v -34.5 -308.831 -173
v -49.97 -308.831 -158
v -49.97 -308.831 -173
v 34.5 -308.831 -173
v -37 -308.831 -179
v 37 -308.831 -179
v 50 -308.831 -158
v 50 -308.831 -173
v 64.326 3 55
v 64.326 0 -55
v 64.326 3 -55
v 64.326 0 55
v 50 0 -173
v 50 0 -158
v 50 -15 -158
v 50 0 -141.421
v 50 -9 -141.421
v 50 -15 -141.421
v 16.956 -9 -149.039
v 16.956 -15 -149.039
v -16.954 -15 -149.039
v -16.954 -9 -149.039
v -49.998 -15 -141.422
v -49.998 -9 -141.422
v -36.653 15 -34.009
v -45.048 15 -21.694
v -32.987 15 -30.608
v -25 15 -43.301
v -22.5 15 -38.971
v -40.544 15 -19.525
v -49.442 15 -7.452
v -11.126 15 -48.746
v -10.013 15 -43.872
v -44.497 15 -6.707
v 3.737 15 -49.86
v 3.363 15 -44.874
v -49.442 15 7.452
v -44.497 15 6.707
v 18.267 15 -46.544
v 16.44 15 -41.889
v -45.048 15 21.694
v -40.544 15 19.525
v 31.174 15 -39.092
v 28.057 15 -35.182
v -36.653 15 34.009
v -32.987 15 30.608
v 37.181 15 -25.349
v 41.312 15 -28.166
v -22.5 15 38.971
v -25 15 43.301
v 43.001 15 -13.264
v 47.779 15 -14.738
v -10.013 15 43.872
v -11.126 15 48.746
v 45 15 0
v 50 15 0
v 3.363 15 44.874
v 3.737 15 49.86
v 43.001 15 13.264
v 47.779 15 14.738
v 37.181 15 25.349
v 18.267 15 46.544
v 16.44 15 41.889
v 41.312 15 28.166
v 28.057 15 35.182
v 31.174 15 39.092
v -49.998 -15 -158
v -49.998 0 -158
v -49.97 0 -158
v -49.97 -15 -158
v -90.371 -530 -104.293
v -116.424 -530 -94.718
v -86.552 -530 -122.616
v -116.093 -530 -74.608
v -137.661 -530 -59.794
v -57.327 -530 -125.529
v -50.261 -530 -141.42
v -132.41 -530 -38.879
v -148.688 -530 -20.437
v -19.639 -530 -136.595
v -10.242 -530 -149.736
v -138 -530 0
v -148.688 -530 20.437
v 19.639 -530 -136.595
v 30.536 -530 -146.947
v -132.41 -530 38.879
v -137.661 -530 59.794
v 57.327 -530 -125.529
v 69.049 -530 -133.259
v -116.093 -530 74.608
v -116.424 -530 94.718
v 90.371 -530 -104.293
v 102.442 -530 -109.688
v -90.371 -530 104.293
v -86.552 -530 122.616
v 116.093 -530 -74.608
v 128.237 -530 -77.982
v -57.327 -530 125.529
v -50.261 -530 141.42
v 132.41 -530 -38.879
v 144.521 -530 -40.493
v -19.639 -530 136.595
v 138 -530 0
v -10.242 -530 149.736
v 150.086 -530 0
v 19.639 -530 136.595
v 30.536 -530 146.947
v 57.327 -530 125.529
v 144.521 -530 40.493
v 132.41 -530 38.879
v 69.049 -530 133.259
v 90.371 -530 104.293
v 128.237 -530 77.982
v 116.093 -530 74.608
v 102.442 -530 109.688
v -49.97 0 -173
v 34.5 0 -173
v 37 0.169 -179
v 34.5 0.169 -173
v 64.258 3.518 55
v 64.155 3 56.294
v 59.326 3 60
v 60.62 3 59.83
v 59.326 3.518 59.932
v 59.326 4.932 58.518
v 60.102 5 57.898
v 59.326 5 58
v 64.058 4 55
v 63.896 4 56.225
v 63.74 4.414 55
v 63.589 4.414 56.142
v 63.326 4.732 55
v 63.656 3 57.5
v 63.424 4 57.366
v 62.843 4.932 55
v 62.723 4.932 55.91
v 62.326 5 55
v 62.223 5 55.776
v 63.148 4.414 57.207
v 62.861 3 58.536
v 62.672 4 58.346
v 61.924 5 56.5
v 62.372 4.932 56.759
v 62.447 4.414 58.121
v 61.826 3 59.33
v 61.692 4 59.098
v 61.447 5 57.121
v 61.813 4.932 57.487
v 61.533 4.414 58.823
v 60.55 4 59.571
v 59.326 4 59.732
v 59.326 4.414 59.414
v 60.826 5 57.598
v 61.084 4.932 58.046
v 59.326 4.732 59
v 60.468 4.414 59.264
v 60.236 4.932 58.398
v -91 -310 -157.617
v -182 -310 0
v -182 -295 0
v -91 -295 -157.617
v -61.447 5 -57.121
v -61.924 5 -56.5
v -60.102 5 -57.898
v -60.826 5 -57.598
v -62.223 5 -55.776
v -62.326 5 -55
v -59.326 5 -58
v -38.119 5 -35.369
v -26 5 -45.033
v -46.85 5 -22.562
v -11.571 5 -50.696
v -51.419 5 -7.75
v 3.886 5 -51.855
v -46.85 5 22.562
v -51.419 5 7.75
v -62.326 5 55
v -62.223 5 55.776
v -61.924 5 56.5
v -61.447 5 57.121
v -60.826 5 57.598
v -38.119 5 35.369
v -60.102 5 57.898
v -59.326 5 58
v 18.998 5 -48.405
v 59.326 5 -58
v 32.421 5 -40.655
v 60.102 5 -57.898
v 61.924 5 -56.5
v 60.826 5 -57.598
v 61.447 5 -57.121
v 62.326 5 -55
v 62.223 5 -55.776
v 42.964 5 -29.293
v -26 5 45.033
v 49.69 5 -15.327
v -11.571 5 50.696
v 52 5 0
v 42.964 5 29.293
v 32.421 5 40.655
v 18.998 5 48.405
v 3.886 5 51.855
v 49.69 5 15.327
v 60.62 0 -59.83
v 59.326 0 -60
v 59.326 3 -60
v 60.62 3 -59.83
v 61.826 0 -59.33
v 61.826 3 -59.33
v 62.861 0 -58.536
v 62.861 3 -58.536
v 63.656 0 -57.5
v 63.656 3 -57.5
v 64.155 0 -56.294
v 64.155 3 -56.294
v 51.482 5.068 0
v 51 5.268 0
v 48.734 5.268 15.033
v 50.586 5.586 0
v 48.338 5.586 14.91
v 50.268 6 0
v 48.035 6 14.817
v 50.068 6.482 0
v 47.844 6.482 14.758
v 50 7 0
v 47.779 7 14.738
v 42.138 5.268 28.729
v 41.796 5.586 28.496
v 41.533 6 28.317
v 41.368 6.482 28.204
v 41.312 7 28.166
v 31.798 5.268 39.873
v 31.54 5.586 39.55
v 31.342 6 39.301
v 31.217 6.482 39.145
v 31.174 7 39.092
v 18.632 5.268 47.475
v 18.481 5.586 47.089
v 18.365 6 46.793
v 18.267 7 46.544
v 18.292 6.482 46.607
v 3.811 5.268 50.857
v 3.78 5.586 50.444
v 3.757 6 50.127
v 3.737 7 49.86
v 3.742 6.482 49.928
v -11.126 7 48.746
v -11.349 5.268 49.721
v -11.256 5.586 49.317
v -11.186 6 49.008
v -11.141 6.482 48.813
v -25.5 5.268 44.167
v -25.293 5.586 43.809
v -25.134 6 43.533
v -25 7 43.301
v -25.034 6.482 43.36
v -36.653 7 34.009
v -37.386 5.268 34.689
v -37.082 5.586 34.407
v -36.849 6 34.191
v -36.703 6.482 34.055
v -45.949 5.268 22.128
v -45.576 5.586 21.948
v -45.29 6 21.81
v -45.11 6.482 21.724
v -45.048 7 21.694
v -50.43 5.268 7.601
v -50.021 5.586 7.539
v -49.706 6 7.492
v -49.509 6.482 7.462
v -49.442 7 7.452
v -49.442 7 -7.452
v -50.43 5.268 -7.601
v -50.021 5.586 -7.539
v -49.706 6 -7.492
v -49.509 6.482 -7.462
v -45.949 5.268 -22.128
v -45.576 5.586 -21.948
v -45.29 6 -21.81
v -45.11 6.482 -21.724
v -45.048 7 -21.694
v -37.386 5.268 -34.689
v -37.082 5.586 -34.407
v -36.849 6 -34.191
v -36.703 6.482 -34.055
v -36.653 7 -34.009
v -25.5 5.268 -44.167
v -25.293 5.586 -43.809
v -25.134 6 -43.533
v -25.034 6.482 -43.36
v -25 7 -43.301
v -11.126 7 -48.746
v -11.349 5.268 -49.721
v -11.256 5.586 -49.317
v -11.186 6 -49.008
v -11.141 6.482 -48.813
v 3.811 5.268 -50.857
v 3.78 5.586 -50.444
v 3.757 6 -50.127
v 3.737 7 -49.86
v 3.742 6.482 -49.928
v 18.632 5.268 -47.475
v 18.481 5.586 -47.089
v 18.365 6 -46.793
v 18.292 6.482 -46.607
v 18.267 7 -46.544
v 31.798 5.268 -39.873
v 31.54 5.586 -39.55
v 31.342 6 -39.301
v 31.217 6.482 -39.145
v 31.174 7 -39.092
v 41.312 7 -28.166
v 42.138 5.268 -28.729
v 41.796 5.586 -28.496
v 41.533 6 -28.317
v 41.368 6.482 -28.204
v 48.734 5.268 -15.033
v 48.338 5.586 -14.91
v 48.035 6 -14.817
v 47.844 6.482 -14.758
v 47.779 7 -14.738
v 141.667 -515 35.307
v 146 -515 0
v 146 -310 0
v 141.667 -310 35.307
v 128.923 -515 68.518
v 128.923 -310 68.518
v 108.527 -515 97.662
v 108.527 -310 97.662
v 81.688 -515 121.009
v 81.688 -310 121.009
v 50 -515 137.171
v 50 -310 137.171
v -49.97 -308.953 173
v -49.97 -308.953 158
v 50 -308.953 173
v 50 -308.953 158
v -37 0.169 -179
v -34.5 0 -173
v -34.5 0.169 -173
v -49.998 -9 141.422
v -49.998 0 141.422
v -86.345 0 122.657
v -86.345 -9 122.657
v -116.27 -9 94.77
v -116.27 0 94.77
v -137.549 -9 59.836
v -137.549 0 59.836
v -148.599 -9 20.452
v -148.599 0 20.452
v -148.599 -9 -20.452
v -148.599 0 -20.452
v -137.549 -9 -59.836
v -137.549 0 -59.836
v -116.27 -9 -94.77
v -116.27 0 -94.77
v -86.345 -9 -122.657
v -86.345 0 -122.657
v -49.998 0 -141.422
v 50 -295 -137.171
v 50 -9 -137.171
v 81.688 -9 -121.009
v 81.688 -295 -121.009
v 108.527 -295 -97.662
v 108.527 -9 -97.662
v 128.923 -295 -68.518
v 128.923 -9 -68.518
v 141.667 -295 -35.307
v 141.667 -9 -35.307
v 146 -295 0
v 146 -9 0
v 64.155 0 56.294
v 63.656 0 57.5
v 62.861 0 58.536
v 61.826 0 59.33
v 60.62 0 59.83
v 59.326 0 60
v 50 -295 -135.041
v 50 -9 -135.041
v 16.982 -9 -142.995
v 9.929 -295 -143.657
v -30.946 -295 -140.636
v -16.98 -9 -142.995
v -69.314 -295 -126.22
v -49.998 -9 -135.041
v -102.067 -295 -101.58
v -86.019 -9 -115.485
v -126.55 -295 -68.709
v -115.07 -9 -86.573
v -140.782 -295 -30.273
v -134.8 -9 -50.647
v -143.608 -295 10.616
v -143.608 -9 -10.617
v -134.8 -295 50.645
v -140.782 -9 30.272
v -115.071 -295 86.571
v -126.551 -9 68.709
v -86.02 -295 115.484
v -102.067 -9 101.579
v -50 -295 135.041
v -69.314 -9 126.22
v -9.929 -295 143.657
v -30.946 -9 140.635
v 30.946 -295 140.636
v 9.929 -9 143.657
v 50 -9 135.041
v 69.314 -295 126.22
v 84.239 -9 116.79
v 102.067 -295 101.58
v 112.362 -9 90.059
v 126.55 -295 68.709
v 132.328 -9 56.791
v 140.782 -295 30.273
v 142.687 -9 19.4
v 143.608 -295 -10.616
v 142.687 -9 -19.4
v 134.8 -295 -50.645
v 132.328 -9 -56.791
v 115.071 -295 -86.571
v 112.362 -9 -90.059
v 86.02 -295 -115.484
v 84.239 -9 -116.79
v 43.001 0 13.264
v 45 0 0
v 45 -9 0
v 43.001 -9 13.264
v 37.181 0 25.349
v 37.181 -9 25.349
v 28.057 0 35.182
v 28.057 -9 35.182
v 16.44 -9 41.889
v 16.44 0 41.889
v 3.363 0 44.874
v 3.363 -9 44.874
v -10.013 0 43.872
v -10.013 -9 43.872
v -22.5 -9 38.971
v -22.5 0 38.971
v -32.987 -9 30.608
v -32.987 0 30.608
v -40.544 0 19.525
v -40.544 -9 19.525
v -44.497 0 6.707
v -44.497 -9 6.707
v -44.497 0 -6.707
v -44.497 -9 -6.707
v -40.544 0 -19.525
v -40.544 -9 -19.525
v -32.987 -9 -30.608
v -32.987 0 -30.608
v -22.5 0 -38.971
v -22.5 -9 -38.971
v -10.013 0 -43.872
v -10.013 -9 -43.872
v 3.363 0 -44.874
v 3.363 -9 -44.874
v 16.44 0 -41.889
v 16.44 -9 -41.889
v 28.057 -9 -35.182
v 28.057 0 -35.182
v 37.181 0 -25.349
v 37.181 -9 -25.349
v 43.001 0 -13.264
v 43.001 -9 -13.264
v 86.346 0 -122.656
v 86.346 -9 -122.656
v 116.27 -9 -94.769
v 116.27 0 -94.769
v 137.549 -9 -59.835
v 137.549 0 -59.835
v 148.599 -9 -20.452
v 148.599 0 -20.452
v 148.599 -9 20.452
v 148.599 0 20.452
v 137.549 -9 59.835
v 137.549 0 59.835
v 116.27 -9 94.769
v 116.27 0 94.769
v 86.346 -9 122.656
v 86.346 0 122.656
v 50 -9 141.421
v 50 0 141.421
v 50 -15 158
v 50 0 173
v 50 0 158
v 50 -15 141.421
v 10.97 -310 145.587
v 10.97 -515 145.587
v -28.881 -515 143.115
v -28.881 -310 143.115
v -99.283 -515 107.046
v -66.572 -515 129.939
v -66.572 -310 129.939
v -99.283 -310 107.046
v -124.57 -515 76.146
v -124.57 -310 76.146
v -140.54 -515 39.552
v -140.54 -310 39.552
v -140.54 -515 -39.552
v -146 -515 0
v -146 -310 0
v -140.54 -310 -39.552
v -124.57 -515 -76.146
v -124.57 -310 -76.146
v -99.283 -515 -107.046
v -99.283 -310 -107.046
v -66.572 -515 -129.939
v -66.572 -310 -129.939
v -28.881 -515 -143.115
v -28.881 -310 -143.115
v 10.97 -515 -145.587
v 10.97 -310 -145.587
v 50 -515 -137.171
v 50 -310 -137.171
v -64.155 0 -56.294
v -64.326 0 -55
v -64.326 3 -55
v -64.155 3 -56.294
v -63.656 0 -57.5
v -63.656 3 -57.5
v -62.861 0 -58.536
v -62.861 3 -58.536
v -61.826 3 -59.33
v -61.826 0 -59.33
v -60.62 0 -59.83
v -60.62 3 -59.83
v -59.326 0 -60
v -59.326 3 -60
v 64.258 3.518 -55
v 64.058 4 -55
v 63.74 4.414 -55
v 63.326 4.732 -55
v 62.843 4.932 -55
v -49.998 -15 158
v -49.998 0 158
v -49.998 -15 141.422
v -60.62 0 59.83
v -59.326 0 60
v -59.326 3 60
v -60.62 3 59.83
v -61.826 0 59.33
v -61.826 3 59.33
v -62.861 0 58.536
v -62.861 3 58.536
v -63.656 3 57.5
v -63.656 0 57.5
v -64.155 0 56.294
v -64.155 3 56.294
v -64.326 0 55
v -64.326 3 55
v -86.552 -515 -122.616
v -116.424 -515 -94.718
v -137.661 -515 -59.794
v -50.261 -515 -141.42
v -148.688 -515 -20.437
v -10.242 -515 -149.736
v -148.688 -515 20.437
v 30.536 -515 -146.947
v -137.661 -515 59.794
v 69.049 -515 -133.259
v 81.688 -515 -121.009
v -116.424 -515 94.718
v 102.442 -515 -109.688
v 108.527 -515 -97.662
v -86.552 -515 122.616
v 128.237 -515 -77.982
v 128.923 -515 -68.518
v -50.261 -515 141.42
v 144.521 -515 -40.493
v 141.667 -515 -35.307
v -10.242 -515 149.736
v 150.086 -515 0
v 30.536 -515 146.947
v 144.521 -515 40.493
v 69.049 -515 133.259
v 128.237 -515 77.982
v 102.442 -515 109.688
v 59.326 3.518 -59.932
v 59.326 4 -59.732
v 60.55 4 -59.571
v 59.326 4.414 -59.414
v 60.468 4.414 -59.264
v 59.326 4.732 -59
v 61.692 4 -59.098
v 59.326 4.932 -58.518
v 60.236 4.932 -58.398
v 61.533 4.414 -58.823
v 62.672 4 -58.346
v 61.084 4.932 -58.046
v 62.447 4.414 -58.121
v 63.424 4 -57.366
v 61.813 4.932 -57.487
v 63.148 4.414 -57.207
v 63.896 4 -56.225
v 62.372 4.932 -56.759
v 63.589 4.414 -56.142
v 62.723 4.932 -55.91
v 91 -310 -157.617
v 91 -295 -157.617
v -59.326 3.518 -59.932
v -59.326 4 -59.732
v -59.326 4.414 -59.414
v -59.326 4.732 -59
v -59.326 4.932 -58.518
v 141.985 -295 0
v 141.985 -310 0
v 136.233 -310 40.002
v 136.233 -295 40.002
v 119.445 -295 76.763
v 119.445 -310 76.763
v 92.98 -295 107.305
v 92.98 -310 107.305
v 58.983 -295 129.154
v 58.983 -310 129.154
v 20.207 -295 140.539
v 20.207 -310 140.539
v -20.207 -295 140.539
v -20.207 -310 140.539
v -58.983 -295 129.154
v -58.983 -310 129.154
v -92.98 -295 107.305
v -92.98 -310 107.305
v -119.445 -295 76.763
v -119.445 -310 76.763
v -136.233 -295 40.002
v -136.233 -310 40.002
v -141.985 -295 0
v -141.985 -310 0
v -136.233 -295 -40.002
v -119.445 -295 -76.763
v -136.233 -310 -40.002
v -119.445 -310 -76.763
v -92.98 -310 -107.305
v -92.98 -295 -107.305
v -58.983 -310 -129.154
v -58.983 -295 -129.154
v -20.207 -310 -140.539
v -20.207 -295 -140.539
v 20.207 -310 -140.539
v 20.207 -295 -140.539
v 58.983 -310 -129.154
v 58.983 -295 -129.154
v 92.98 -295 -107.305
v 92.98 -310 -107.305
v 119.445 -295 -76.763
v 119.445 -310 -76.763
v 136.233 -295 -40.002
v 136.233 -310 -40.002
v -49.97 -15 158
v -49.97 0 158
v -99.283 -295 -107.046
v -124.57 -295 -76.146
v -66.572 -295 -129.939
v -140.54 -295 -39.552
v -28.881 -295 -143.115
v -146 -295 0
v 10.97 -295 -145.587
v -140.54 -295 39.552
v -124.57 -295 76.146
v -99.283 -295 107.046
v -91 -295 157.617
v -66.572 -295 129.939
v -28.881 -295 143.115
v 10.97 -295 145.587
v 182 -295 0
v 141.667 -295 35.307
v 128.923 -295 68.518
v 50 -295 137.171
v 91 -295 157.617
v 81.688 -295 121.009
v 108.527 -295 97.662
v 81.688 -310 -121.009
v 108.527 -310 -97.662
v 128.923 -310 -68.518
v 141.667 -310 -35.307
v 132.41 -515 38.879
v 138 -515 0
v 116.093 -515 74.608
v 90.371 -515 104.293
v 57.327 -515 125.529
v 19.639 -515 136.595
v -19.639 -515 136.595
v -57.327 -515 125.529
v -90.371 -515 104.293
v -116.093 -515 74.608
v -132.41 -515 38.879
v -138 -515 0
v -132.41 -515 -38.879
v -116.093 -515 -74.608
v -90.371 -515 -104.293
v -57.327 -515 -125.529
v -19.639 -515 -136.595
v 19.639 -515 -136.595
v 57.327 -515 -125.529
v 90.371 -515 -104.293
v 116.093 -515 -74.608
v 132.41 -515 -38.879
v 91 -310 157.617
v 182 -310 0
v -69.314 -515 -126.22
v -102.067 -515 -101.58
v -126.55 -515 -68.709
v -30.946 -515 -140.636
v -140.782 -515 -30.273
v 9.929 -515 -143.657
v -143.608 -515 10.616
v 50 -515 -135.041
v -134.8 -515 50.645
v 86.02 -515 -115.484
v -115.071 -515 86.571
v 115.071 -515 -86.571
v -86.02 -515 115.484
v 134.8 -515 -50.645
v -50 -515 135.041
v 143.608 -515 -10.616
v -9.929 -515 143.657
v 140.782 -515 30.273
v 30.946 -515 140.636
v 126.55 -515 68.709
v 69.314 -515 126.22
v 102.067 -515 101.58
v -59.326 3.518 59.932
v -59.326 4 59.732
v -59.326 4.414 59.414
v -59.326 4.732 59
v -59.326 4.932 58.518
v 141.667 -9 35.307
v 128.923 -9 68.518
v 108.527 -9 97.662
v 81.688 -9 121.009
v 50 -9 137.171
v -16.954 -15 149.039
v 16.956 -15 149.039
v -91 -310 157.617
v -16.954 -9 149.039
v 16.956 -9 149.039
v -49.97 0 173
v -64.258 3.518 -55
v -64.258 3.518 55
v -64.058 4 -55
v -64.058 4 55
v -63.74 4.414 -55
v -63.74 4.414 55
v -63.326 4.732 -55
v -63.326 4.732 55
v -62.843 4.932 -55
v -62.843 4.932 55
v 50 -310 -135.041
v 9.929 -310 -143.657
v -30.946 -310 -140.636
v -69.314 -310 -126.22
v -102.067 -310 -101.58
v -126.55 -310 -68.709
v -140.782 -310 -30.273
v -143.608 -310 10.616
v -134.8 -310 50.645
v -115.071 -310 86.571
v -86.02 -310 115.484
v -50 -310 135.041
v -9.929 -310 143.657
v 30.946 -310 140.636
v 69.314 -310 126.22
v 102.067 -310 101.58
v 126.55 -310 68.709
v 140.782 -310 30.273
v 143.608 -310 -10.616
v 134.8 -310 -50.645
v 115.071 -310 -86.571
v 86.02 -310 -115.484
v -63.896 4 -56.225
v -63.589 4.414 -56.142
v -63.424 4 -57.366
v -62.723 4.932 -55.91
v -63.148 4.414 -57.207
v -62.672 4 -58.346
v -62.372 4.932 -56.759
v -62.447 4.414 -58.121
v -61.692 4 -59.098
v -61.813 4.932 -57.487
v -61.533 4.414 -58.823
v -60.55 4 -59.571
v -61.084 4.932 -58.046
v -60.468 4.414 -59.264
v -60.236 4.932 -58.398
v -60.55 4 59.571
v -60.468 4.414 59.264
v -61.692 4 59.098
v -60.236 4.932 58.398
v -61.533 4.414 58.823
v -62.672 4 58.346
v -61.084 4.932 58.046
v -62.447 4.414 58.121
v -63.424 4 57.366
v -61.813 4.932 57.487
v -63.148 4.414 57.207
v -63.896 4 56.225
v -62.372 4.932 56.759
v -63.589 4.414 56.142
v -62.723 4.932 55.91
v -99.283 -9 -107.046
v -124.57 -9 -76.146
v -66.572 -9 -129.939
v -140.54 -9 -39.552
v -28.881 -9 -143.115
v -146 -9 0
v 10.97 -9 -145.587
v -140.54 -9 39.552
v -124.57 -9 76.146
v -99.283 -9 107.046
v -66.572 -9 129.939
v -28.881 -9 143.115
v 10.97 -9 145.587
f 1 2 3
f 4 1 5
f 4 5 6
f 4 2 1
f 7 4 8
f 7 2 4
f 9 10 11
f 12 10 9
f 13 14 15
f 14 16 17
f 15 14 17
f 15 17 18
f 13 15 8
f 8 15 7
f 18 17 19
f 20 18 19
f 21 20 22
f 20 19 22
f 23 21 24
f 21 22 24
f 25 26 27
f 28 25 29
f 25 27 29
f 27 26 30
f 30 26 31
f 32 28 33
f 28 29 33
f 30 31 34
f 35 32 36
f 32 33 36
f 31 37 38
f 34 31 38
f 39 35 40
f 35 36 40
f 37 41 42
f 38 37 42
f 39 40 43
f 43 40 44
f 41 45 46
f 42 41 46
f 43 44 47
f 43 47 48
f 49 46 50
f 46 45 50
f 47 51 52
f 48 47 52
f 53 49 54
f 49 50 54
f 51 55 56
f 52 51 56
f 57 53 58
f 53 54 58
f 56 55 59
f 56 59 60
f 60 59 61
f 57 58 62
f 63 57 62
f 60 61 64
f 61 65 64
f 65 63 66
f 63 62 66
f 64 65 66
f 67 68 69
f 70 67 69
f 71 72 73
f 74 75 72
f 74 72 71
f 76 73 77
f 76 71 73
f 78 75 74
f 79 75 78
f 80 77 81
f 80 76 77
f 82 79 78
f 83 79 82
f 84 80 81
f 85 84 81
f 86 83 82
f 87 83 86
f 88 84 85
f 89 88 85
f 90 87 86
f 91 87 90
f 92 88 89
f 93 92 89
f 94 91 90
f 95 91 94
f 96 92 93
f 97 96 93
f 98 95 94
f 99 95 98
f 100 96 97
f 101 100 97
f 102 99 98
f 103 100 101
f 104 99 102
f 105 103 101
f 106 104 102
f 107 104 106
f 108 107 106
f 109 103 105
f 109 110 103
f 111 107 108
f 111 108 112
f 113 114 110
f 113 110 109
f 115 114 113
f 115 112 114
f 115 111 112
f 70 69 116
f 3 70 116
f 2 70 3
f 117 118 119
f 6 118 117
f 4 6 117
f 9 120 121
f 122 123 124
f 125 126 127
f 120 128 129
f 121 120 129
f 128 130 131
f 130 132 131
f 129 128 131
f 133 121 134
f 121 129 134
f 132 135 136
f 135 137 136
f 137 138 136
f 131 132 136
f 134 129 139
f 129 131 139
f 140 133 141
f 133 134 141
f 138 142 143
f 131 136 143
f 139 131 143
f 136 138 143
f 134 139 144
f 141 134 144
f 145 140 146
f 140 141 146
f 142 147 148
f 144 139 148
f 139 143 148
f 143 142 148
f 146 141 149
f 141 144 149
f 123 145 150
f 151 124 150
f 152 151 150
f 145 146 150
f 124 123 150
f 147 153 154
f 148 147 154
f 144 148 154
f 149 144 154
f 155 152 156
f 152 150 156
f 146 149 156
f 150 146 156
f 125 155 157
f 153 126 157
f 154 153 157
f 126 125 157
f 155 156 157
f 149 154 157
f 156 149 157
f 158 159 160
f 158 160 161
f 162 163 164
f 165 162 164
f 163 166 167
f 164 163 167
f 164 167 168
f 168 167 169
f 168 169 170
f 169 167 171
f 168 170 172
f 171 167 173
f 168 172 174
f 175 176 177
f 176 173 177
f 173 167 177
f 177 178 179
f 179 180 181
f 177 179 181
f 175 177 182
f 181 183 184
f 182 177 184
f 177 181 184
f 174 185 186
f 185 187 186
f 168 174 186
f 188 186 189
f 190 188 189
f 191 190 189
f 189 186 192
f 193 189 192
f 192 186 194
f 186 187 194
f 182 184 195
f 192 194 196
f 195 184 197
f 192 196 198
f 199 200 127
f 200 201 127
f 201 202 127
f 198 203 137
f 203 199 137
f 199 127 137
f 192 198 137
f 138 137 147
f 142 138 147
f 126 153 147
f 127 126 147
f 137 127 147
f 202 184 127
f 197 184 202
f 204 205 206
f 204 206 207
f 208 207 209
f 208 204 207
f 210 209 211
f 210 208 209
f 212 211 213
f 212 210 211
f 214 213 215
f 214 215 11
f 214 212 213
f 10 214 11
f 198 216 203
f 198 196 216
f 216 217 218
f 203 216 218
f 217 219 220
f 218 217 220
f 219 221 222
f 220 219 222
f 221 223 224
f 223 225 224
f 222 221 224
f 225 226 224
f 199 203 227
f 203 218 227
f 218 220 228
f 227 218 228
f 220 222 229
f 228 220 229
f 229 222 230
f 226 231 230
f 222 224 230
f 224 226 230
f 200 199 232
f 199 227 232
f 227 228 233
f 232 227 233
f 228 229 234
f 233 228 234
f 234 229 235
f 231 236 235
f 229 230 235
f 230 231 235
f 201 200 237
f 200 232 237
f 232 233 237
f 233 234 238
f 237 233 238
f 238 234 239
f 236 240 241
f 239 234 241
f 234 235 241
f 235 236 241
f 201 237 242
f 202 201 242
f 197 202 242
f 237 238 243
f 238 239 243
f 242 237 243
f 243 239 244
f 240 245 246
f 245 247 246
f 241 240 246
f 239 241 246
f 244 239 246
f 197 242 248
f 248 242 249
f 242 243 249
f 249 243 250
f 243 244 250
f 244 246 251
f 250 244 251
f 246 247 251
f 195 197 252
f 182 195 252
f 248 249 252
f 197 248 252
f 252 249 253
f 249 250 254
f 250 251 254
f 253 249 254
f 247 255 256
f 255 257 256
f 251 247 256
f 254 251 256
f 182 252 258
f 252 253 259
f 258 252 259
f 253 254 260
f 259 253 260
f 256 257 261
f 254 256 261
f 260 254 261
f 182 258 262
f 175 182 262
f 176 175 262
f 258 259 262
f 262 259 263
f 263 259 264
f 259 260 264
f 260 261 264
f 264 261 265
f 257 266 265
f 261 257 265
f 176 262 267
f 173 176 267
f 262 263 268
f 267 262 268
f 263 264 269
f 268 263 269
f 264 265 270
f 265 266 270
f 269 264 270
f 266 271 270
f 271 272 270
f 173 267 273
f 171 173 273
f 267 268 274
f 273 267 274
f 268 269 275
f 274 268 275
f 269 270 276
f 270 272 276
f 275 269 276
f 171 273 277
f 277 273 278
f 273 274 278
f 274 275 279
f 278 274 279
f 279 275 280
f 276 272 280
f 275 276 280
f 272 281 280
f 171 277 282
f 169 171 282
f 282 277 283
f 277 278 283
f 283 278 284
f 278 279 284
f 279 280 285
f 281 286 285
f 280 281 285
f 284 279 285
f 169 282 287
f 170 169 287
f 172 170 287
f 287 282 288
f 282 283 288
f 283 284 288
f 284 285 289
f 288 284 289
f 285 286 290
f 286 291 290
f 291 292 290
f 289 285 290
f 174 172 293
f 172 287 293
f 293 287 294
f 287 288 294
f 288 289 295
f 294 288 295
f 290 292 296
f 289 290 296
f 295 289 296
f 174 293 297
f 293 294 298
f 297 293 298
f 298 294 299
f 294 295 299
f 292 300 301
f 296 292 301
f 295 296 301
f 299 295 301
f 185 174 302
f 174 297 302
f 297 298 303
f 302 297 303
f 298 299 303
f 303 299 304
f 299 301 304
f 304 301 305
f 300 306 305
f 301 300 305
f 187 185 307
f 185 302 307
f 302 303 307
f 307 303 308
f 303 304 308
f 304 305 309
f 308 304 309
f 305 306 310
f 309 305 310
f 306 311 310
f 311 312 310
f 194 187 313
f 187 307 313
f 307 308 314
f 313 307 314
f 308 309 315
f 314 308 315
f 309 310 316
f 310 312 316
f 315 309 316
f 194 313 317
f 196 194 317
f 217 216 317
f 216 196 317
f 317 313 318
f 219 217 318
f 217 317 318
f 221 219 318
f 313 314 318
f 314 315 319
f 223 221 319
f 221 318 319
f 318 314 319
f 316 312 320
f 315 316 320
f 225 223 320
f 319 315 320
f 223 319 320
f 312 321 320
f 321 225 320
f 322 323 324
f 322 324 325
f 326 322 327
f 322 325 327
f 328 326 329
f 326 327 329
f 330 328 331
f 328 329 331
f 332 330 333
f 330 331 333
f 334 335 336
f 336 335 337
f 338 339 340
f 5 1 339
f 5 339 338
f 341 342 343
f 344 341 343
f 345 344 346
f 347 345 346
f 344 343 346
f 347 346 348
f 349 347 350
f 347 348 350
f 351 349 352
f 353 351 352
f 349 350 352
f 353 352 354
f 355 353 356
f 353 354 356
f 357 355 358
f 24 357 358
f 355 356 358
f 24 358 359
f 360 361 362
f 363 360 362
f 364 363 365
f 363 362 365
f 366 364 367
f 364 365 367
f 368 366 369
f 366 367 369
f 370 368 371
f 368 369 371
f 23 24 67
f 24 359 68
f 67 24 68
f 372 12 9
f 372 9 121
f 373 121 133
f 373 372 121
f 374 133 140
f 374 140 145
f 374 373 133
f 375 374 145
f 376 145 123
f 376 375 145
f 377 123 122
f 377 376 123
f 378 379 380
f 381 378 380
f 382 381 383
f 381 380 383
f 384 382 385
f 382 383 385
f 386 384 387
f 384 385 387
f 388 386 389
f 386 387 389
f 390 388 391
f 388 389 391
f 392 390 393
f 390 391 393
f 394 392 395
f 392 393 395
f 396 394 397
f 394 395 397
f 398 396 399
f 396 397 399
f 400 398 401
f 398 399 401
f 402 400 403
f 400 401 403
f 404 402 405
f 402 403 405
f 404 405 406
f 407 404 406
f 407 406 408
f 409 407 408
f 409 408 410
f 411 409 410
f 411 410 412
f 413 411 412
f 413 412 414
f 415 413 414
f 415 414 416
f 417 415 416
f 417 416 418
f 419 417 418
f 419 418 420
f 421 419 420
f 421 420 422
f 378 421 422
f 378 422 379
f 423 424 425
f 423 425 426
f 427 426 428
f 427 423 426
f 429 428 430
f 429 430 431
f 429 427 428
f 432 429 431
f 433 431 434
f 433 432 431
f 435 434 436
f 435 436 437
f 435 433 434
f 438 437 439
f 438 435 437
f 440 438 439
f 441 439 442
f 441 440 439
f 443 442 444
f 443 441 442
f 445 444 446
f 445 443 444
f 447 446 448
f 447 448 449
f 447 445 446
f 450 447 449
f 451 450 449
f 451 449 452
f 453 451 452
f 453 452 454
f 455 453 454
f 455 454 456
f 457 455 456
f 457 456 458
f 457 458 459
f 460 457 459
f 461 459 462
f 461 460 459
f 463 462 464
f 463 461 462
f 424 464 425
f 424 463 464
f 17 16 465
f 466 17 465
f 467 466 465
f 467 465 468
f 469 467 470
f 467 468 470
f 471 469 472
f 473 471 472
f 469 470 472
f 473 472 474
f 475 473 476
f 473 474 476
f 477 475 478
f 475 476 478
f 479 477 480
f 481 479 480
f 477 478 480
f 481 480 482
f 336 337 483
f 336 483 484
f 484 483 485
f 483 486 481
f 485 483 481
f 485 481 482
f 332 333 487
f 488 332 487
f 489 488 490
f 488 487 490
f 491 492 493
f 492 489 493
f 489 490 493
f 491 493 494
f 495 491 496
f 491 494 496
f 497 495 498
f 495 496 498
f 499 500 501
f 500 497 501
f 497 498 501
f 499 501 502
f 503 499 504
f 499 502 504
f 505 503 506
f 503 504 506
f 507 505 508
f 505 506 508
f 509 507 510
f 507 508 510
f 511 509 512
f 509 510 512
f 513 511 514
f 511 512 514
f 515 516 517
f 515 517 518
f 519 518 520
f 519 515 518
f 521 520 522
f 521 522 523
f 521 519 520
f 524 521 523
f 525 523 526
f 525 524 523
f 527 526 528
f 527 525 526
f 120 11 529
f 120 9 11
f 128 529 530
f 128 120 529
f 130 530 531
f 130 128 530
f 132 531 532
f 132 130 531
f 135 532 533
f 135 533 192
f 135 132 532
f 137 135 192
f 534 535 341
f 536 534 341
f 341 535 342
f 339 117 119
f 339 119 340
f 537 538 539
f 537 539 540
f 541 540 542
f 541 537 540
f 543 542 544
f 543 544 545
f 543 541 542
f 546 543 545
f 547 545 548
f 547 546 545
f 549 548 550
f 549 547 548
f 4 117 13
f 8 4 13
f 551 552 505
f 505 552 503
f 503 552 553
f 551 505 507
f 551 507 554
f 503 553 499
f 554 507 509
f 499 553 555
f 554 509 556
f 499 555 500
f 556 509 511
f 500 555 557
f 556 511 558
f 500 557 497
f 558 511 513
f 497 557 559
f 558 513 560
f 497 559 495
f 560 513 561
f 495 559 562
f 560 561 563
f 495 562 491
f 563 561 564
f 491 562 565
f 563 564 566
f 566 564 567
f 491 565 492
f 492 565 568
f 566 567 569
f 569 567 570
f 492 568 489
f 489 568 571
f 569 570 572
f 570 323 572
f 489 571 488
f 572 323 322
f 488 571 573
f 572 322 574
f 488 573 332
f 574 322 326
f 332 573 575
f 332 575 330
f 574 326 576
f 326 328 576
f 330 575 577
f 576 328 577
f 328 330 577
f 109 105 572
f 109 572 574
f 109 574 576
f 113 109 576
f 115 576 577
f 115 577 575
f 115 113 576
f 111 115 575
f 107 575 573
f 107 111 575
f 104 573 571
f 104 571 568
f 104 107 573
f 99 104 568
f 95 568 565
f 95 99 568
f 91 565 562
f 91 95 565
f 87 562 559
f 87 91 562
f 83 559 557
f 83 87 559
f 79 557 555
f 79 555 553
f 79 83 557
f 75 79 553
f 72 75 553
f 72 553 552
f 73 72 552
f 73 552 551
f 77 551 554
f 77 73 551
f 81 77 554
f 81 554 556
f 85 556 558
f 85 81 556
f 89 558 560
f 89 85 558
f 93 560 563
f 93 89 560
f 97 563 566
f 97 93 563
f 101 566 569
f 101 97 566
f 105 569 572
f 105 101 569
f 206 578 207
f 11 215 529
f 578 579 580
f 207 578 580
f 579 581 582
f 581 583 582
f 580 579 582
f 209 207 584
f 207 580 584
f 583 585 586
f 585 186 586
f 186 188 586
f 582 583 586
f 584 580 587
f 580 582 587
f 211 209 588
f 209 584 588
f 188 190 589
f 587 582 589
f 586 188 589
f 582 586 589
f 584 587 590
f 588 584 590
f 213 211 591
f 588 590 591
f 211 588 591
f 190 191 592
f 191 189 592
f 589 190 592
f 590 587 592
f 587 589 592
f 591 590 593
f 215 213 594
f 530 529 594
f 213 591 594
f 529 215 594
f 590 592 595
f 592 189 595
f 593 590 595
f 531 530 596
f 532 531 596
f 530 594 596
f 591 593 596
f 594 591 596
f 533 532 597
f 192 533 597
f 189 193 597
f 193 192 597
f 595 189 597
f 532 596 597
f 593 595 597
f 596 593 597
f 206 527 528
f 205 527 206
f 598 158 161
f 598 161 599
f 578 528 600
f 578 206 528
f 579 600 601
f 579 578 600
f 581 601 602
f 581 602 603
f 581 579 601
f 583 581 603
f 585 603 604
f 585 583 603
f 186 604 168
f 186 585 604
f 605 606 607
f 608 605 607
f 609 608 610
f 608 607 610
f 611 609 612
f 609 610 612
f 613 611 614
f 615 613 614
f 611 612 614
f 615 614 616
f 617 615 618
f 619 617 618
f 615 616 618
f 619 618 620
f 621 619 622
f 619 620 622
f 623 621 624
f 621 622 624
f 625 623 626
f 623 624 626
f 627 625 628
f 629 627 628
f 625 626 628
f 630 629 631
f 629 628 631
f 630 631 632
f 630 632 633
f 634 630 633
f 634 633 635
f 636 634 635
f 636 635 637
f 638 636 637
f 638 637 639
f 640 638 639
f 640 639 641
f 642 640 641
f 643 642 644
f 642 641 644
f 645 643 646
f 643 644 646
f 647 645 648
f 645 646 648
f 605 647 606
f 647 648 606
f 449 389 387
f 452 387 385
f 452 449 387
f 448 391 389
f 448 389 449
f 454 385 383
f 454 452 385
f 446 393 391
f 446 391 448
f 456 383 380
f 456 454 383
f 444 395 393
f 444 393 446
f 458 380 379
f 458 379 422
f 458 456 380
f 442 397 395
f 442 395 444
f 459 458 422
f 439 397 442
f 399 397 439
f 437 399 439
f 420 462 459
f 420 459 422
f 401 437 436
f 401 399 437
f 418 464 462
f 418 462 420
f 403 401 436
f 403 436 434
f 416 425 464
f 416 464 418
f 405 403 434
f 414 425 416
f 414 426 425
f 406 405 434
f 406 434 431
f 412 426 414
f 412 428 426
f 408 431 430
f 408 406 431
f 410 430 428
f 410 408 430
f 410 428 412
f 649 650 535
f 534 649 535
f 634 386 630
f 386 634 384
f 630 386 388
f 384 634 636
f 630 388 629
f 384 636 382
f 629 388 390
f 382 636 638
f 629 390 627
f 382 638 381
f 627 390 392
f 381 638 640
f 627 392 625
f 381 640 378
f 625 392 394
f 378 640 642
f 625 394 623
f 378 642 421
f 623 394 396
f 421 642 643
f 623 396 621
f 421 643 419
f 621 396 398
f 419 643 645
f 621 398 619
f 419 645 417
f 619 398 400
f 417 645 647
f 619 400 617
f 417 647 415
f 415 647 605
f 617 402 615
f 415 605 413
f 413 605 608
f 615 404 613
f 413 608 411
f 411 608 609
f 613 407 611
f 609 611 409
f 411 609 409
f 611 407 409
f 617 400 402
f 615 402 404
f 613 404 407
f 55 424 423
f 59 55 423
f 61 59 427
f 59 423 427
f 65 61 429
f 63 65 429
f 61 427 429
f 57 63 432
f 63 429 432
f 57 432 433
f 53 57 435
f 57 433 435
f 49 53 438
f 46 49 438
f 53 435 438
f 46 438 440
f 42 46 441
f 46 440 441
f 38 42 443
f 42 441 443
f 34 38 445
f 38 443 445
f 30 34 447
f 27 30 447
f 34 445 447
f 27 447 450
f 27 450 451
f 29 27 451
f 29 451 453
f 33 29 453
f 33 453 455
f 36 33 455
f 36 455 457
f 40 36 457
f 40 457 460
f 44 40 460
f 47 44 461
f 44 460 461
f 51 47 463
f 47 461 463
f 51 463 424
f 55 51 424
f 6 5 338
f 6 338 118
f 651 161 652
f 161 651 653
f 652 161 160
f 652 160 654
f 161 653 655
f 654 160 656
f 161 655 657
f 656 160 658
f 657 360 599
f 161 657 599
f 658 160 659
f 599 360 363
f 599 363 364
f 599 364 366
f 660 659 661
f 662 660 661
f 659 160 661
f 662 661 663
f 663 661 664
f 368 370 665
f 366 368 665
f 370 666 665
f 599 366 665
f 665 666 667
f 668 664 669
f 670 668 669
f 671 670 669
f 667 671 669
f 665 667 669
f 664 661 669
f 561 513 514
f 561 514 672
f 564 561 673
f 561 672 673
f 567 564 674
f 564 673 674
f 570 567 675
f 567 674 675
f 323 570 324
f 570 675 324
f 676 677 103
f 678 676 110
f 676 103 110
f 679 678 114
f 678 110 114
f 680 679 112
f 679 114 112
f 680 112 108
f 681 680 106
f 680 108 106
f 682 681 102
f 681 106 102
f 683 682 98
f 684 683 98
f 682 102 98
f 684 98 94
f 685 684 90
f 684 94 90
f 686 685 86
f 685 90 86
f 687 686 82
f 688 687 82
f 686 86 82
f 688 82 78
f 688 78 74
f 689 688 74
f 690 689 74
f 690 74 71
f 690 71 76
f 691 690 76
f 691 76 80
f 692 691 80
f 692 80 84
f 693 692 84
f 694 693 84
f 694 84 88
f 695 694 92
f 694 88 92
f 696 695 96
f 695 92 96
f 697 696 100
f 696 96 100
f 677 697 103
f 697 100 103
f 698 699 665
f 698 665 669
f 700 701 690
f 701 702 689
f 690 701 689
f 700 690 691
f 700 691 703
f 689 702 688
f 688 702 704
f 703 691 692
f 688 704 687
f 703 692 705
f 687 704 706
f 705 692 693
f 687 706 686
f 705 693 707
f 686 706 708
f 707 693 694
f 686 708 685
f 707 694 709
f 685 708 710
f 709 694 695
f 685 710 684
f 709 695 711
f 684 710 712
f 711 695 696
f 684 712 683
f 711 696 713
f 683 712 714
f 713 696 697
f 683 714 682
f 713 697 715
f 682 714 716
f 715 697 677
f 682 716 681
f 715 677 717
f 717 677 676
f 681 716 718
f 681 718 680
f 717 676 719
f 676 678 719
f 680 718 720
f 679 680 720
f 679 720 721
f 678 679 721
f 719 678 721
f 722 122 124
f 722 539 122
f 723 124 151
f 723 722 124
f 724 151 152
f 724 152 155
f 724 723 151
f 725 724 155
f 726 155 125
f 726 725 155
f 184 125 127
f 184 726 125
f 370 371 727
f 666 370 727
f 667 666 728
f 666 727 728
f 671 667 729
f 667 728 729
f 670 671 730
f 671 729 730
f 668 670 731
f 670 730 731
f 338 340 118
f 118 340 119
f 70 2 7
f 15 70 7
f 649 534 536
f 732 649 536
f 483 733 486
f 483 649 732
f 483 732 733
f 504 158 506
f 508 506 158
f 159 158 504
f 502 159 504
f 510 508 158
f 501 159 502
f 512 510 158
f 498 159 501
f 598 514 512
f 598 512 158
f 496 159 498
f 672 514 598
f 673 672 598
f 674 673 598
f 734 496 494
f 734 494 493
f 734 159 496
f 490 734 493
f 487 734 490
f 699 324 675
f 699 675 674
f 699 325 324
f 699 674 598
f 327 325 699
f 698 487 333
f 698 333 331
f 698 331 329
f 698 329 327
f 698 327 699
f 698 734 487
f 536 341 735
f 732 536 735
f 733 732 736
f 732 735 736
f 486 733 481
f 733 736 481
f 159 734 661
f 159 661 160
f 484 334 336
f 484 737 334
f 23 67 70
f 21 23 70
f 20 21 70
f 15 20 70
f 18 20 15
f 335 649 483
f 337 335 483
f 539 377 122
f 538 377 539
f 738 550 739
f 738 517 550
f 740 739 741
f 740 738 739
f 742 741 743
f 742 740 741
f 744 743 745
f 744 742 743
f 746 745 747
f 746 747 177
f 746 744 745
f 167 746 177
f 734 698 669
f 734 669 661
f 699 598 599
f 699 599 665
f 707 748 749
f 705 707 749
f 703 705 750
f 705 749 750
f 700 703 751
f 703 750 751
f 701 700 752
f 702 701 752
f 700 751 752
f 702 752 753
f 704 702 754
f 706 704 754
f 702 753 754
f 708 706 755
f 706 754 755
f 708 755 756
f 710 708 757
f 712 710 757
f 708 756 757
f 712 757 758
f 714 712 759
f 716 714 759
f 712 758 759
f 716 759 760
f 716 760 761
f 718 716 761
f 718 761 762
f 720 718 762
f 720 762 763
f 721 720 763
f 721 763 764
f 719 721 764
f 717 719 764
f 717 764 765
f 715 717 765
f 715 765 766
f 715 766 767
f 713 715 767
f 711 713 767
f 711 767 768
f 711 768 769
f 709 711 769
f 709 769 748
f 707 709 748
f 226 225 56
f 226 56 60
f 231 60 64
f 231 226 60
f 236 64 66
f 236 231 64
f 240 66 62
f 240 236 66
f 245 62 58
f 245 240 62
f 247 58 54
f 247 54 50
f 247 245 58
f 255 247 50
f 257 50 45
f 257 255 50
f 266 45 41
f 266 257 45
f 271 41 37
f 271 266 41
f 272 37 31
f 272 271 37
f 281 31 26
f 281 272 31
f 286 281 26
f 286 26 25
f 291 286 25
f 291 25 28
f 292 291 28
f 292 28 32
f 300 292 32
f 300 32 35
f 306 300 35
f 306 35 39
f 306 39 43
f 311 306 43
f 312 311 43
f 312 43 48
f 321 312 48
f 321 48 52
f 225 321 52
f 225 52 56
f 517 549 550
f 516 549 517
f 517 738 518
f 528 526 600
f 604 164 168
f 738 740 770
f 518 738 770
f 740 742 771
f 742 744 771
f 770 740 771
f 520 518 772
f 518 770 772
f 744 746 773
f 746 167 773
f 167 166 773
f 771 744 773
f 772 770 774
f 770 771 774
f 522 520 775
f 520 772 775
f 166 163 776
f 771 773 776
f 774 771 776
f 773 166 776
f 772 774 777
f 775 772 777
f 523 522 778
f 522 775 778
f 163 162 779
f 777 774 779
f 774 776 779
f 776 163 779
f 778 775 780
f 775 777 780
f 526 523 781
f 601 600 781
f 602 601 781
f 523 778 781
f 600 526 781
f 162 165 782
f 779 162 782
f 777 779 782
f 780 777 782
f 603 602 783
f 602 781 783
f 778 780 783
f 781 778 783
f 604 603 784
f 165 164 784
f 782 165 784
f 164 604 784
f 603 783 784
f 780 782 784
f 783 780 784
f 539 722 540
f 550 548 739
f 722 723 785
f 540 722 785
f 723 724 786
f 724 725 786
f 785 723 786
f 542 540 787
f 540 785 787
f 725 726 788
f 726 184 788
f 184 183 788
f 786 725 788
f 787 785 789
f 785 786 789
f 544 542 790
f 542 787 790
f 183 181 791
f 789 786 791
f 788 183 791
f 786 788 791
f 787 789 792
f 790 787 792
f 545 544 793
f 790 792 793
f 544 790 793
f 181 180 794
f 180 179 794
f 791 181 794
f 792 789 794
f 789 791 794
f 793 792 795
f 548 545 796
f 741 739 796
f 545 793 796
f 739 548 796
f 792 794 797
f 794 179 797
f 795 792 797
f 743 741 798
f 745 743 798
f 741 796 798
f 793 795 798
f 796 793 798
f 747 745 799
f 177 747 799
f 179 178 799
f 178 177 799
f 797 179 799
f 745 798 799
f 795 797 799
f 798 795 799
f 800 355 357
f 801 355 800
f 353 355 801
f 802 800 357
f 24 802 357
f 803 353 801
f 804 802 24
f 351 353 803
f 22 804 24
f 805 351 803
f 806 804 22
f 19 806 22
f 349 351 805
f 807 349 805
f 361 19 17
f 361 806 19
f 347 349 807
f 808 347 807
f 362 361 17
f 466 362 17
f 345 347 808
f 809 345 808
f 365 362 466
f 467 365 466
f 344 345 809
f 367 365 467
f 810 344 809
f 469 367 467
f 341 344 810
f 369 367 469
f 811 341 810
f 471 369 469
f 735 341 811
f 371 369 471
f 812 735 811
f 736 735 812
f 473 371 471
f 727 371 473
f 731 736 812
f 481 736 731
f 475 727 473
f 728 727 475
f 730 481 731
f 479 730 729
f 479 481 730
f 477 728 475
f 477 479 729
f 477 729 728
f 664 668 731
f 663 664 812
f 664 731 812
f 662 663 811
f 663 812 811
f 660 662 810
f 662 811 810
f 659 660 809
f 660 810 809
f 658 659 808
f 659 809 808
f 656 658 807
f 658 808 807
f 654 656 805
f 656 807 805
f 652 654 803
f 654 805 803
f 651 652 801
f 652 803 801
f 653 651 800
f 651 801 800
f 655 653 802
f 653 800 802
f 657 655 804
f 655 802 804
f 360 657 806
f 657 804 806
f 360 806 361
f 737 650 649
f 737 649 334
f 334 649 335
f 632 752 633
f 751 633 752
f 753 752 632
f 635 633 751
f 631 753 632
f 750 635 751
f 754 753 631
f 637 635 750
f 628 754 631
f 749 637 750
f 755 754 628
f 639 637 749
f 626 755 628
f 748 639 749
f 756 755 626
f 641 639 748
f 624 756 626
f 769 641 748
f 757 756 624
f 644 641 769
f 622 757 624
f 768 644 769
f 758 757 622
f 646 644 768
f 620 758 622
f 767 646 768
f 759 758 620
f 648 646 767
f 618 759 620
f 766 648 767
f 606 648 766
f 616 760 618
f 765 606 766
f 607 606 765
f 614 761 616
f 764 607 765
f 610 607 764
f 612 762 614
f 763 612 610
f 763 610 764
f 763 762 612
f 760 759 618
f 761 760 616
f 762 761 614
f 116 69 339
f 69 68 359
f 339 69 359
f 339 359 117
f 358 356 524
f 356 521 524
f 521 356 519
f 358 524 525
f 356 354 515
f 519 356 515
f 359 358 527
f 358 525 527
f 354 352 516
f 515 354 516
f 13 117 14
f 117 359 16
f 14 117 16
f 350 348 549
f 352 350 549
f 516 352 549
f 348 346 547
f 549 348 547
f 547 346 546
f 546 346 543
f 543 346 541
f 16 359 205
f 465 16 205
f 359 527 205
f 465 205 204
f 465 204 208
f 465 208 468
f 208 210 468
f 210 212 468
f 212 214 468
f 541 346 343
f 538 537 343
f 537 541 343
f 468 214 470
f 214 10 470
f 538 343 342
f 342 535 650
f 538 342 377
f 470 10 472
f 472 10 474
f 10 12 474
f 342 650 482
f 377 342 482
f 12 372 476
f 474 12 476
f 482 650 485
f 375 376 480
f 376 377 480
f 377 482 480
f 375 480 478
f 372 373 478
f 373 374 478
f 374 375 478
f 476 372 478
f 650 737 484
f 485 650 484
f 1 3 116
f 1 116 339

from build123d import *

# Parameters (mm, degrees)
F1_DEPTH  = 530
F0_R      = 50
F0_R_2    = 45
F2_DEPTH  = 9
F3_R      = 150.0861563529
F3_R_2    = 146
F3_R_3    = 144
F3_R_4    = 138
F4_DEPTH  = 15
F5_DEPTH  = 15
F7_R      = 141.9845884843
F8_DEPTH  = 15
F9_W      = 99.9695800245
F9_H      = 293.9526891708
F9_H_2    = 15
F10_DEPTH = 15
F11_W     = 99.9695800245
F11_H     = 308.8312447071
F12_DEPTH = 15
F14_DEPTH = 309
F15_DEPTH = 15
F16_DEPTH = 5
F17_R     = 2


with BuildPart() as f1:
    # F0 (on Front) → F1 (new body)
    with BuildSketch(Plane.XZ):
        with BuildLine():
            Line((50, 135.0407345952), (50, 137.1714255959))
            ThreePointArc((50, 137.1714255959), (0.000857941, 145.9999999975), (-49.9983878734, 137.1720132172))
            Line((-49.9983878734, 137.1720132172), (-49.9983878734, 135.041331488))
            ThreePointArc((-49.9983878734, 135.041331488), (0.0008595396, 143.9999999974), (50, 135.0407345952))
        make_face()
        with BuildLine():
            Line((-49.9983878734, 135.041331488), (-49.9983878734, 137.1720132172))
            ThreePointArc((-49.9983878734, 137.1720132172), (-146, 0), (-49.9983878734, -137.1720132172))
            Line((-49.9983878734, -137.1720132172), (-49.9983878734, -135.041331488))
            ThreePointArc((-49.9983878734, -135.041331488), (-144, 0), (-49.9983878734, 135.041331488))
        make_face()
        with BuildLine():
            ThreePointArc((-49.9983878734, -137.1720132172), (0.000857941, -145.9999999975), (50, -137.1714255959))
            Line((50, -137.1714255959), (50, -135.0407345952))
            ThreePointArc((50, -135.0407345952), (0.0008595396, -143.9999999974), (-49.9983878734, -135.041331488))
            Line((-49.9983878734, -135.041331488), (-49.9983878734, -137.1720132172))
        make_face()
        with BuildLine():
            ThreePointArc((146, 0), (119.6160524344, 83.7137981458), (50, 137.1714255959))
            Line((50, 137.1714255959), (50, 135.0407345952))
            ThreePointArc((50, 135.0407345952), (118.1862936216, 82.2678552048), (144, 0))
            ThreePointArc((144, 0), (118.1862936216, -82.2678552048), (50, -135.0407345952))
            Line((50, -135.0407345952), (50, -137.1714255959))
            ThreePointArc((50, -137.1714255959), (119.6160524344, -83.7137981458), (146, 0))
        make_face()
    extrude(amount=F1_DEPTH)

    # F0 (on Front) → F2 (join)
    with BuildSketch(Plane.XZ):
        with BuildLine():
            ThreePointArc((144, 0), (118.1862936216, 82.2678552048), (50, 135.0407345952))
            ThreePointArc((50, 135.0407345952), (0.0008595396, 143.9999999974), (-49.9983878734, 135.041331488))
            ThreePointArc((-49.9983878734, 135.041331488), (-144, 0), (-49.9983878734, -135.041331488))
            ThreePointArc((-49.9983878734, -135.041331488), (0.0008595396, -143.9999999974), (50, -135.0407345952))
            ThreePointArc((50, -135.0407345952), (118.1862936216, -82.2678552048), (144, 0))
        make_face()
        with BuildLine():
            Line((-59.3256604671, 60), (59.3256604671, 60))
            ThreePointArc((59.3256604671, 60), (62.8611943731, 58.5355339059), (64.3256604671, 55))
            Line((64.3256604671, 55), (64.3256604671, -55))
            ThreePointArc((64.3256604671, -55), (62.8611943731, -58.5355339059), (59.3256604671, -60))
            Line((59.3256604671, -60), (-59.3256604671, -60))
            ThreePointArc((-59.3256604671, -60), (-62.8611943731, -58.5355339059), (-64.3256604671, -55))
            Line((-64.3256604671, -55), (-64.3256604671, 55))
            ThreePointArc((-64.3256604671, 55), (-62.8611943731, 58.5355339059), (-59.3256604671, 60))
        make_face(mode=Mode.SUBTRACT)
        with BuildLine():
            Line((50, 137.1714255959), (50, 141.4213562373))
            ThreePointArc((50, 141.4213562373), (0.0008549575, 149.9999999976), (-49.9983878734, 141.4219261998))
            Line((-49.9983878734, 141.4219261998), (-49.9983878734, 137.1720132172))
            ThreePointArc((-49.9983878734, 137.1720132172), (0.000857941, 145.9999999975), (50, 137.1714255959))
        make_face()
        with BuildLine():
            Line((-49.9983878734, 137.1720132172), (-49.9983878734, 141.4219261998))
            ThreePointArc((-49.9983878734, 141.4219261998), (-150, 0), (-49.9983878734, -141.4219261998))
            Line((-49.9983878734, -141.4219261998), (-49.9983878734, -137.1720132172))
            ThreePointArc((-49.9983878734, -137.1720132172), (-146, 0), (-49.9983878734, 137.1720132172))
        make_face()
        with BuildLine():
            ThreePointArc((-49.9983878734, -141.4219261998), (0.0008549575, -149.9999999976), (50, -141.4213562373))
            Line((50, -141.4213562373), (50, -137.1714255959))
            ThreePointArc((50, -137.1714255959), (0.000857941, -145.9999999975), (-49.9983878734, -137.1720132172))
            Line((-49.9983878734, -137.1720132172), (-49.9983878734, -141.4219261998))
        make_face()
        with BuildLine():
            ThreePointArc((50, -141.4213562373), (122.4744871392, -86.6025403784), (150, 0))
            ThreePointArc((150, 0), (122.4744871392, 86.6025403784), (50, 141.4213562373))
            Line((50, 141.4213562373), (50, 137.1714255959))
            ThreePointArc((50, 137.1714255959), (119.6160524344, 83.7137981458), (146, 0))
            ThreePointArc((146, 0), (119.6160524344, -83.7137981458), (50, -137.1714255959))
            Line((50, -137.1714255959), (50, -141.4213562373))
        make_face()
        with BuildLine():
            ThreePointArc((64.3256604671, 55), (62.8611943731, 58.5355339059), (59.3256604671, 60))
            Line((59.3256604671, 60), (-59.3256604671, 60))
            ThreePointArc((-59.3256604671, 60), (-62.8611943731, 58.5355339059), (-64.3256604671, 55))
            Line((-64.3256604671, 55), (-64.3256604671, -55))
            ThreePointArc((-64.3256604671, -55), (-62.8611943731, -58.5355339059), (-59.3256604671, -60))
            Line((-59.3256604671, -60), (59.3256604671, -60))
            ThreePointArc((59.3256604671, -60), (62.8611943731, -58.5355339059), (64.3256604671, -55))
            Line((64.3256604671, -55), (64.3256604671, 55))
        make_face()
        Circle(F0_R, mode=Mode.SUBTRACT)
        Circle(F0_R)
        Circle(F0_R_2, mode=Mode.SUBTRACT)
    extrude(amount=F2_DEPTH)

    # F3 (on face) → F4 (join)
    with BuildSketch(Plane.XZ.offset(530)):
        Circle(F3_R)
        Circle(F3_R_2, mode=Mode.SUBTRACT)
        Circle(F3_R_2)
        Circle(F3_R_3, mode=Mode.SUBTRACT)
        Circle(F3_R_3)
        Circle(F3_R_4, mode=Mode.SUBTRACT)
    extrude(amount=-F4_DEPTH)

    # F0 (on Front) → F5 (join)
    with BuildSketch(Plane.XZ):
        with BuildLine():
            ThreePointArc((-49.9983878734, 141.4219261998), (0.0008549575, 149.9999999976), (50, 141.4213562373))
            Line((50, 141.4213562373), (50, 158))
            Line((50, 158), (-49.9983878734, 158))
            Line((-49.9983878734, 158), (-49.9983878734, 141.4219261998))
        make_face()
        with BuildLine():
            Line((50, -158), (50, -141.4213562373))
            ThreePointArc((50, -141.4213562373), (0.0008549575, -149.9999999976), (-49.9983878734, -141.4219261998))
            Line((-49.9983878734, -141.4219261998), (-49.9983878734, -158))
            Line((-49.9983878734, -158), (-34.5, -158))
            Line((-34.5, -158), (34.5, -158))
            Line((34.5, -158), (50, -158))
        make_face()
    extrude(amount=F5_DEPTH)

    # F7 (on offset) → F8 (join)
    with BuildSketch(Plane.XZ.offset(310)):
        Polygon((-91, 157.6166234888), (-182, 0), (-91, -157.6166234888), (91, -157.6166234888), (182, 0), (91, 157.6166234888), align=None)
        Circle(F7_R, mode=Mode.SUBTRACT)
    extrude(amount=-F8_DEPTH)

    # F9 (on face) → F10 (join)
    with BuildSketch(Plane.XY.offset(158)):
        with Locations((0.0152099878, -161.9763445854)):
            Rectangle(F9_W, F9_H)
        with Locations((0.0152099878, -7.5)):
            Rectangle(F9_W, F9_H_2)
    extrude(amount=F10_DEPTH)

    # F11 (on face) → F12 (join)
    with BuildSketch(Plane(origin=(0, 0, -158), x_dir=(1, 0, 0), z_dir=(0, 0, -1))):
        with Locations((0.0152099878, 154.4156223536)):
            Rectangle(F11_W, F11_H)
    extrude(amount=F12_DEPTH)

    # F13 (on face) → F14 (join)
    with BuildSketch(Plane.XZ.offset(308.8312447071)):
        Polygon((37, -179), (34.5, -173), (-34.5, -173), (-37, -179), align=None)
    extrude(amount=-F14_DEPTH)

    # F0 (on Front) → F15 (join)
    with BuildSketch(Plane.XZ):
        Circle(F0_R)
        Circle(F0_R_2, mode=Mode.SUBTRACT)
    extrude(amount=-F15_DEPTH)

    # F0 (on Front) → F16 (join)
    with BuildSketch(Plane.XZ):
        with BuildLine():
            ThreePointArc((64.3256604671, 55), (62.8611943731, 58.5355339059), (59.3256604671, 60))
            Line((59.3256604671, 60), (-59.3256604671, 60))
            ThreePointArc((-59.3256604671, 60), (-62.8611943731, 58.5355339059), (-64.3256604671, 55))
            Line((-64.3256604671, 55), (-64.3256604671, -55))
            ThreePointArc((-64.3256604671, -55), (-62.8611943731, -58.5355339059), (-59.3256604671, -60))
            Line((-59.3256604671, -60), (59.3256604671, -60))
            ThreePointArc((59.3256604671, -60), (62.8611943731, -58.5355339059), (64.3256604671, -55))
            Line((64.3256604671, -55), (64.3256604671, 55))
        make_face()
        Circle(F0_R, mode=Mode.SUBTRACT)
    extrude(amount=-F16_DEPTH)

    # F17
    f17_edges = [f1.edges().sort_by_distance(p)[0] for p in [
        (64.32566, 5, 0),
        (0, 5, 60),
        (-64.32566, 5, 0),
        (0, 5, -60),
        (-50, 5, 0),
    ]]
    fillet(f17_edges, radius=F17_R)


solid = f1.part
